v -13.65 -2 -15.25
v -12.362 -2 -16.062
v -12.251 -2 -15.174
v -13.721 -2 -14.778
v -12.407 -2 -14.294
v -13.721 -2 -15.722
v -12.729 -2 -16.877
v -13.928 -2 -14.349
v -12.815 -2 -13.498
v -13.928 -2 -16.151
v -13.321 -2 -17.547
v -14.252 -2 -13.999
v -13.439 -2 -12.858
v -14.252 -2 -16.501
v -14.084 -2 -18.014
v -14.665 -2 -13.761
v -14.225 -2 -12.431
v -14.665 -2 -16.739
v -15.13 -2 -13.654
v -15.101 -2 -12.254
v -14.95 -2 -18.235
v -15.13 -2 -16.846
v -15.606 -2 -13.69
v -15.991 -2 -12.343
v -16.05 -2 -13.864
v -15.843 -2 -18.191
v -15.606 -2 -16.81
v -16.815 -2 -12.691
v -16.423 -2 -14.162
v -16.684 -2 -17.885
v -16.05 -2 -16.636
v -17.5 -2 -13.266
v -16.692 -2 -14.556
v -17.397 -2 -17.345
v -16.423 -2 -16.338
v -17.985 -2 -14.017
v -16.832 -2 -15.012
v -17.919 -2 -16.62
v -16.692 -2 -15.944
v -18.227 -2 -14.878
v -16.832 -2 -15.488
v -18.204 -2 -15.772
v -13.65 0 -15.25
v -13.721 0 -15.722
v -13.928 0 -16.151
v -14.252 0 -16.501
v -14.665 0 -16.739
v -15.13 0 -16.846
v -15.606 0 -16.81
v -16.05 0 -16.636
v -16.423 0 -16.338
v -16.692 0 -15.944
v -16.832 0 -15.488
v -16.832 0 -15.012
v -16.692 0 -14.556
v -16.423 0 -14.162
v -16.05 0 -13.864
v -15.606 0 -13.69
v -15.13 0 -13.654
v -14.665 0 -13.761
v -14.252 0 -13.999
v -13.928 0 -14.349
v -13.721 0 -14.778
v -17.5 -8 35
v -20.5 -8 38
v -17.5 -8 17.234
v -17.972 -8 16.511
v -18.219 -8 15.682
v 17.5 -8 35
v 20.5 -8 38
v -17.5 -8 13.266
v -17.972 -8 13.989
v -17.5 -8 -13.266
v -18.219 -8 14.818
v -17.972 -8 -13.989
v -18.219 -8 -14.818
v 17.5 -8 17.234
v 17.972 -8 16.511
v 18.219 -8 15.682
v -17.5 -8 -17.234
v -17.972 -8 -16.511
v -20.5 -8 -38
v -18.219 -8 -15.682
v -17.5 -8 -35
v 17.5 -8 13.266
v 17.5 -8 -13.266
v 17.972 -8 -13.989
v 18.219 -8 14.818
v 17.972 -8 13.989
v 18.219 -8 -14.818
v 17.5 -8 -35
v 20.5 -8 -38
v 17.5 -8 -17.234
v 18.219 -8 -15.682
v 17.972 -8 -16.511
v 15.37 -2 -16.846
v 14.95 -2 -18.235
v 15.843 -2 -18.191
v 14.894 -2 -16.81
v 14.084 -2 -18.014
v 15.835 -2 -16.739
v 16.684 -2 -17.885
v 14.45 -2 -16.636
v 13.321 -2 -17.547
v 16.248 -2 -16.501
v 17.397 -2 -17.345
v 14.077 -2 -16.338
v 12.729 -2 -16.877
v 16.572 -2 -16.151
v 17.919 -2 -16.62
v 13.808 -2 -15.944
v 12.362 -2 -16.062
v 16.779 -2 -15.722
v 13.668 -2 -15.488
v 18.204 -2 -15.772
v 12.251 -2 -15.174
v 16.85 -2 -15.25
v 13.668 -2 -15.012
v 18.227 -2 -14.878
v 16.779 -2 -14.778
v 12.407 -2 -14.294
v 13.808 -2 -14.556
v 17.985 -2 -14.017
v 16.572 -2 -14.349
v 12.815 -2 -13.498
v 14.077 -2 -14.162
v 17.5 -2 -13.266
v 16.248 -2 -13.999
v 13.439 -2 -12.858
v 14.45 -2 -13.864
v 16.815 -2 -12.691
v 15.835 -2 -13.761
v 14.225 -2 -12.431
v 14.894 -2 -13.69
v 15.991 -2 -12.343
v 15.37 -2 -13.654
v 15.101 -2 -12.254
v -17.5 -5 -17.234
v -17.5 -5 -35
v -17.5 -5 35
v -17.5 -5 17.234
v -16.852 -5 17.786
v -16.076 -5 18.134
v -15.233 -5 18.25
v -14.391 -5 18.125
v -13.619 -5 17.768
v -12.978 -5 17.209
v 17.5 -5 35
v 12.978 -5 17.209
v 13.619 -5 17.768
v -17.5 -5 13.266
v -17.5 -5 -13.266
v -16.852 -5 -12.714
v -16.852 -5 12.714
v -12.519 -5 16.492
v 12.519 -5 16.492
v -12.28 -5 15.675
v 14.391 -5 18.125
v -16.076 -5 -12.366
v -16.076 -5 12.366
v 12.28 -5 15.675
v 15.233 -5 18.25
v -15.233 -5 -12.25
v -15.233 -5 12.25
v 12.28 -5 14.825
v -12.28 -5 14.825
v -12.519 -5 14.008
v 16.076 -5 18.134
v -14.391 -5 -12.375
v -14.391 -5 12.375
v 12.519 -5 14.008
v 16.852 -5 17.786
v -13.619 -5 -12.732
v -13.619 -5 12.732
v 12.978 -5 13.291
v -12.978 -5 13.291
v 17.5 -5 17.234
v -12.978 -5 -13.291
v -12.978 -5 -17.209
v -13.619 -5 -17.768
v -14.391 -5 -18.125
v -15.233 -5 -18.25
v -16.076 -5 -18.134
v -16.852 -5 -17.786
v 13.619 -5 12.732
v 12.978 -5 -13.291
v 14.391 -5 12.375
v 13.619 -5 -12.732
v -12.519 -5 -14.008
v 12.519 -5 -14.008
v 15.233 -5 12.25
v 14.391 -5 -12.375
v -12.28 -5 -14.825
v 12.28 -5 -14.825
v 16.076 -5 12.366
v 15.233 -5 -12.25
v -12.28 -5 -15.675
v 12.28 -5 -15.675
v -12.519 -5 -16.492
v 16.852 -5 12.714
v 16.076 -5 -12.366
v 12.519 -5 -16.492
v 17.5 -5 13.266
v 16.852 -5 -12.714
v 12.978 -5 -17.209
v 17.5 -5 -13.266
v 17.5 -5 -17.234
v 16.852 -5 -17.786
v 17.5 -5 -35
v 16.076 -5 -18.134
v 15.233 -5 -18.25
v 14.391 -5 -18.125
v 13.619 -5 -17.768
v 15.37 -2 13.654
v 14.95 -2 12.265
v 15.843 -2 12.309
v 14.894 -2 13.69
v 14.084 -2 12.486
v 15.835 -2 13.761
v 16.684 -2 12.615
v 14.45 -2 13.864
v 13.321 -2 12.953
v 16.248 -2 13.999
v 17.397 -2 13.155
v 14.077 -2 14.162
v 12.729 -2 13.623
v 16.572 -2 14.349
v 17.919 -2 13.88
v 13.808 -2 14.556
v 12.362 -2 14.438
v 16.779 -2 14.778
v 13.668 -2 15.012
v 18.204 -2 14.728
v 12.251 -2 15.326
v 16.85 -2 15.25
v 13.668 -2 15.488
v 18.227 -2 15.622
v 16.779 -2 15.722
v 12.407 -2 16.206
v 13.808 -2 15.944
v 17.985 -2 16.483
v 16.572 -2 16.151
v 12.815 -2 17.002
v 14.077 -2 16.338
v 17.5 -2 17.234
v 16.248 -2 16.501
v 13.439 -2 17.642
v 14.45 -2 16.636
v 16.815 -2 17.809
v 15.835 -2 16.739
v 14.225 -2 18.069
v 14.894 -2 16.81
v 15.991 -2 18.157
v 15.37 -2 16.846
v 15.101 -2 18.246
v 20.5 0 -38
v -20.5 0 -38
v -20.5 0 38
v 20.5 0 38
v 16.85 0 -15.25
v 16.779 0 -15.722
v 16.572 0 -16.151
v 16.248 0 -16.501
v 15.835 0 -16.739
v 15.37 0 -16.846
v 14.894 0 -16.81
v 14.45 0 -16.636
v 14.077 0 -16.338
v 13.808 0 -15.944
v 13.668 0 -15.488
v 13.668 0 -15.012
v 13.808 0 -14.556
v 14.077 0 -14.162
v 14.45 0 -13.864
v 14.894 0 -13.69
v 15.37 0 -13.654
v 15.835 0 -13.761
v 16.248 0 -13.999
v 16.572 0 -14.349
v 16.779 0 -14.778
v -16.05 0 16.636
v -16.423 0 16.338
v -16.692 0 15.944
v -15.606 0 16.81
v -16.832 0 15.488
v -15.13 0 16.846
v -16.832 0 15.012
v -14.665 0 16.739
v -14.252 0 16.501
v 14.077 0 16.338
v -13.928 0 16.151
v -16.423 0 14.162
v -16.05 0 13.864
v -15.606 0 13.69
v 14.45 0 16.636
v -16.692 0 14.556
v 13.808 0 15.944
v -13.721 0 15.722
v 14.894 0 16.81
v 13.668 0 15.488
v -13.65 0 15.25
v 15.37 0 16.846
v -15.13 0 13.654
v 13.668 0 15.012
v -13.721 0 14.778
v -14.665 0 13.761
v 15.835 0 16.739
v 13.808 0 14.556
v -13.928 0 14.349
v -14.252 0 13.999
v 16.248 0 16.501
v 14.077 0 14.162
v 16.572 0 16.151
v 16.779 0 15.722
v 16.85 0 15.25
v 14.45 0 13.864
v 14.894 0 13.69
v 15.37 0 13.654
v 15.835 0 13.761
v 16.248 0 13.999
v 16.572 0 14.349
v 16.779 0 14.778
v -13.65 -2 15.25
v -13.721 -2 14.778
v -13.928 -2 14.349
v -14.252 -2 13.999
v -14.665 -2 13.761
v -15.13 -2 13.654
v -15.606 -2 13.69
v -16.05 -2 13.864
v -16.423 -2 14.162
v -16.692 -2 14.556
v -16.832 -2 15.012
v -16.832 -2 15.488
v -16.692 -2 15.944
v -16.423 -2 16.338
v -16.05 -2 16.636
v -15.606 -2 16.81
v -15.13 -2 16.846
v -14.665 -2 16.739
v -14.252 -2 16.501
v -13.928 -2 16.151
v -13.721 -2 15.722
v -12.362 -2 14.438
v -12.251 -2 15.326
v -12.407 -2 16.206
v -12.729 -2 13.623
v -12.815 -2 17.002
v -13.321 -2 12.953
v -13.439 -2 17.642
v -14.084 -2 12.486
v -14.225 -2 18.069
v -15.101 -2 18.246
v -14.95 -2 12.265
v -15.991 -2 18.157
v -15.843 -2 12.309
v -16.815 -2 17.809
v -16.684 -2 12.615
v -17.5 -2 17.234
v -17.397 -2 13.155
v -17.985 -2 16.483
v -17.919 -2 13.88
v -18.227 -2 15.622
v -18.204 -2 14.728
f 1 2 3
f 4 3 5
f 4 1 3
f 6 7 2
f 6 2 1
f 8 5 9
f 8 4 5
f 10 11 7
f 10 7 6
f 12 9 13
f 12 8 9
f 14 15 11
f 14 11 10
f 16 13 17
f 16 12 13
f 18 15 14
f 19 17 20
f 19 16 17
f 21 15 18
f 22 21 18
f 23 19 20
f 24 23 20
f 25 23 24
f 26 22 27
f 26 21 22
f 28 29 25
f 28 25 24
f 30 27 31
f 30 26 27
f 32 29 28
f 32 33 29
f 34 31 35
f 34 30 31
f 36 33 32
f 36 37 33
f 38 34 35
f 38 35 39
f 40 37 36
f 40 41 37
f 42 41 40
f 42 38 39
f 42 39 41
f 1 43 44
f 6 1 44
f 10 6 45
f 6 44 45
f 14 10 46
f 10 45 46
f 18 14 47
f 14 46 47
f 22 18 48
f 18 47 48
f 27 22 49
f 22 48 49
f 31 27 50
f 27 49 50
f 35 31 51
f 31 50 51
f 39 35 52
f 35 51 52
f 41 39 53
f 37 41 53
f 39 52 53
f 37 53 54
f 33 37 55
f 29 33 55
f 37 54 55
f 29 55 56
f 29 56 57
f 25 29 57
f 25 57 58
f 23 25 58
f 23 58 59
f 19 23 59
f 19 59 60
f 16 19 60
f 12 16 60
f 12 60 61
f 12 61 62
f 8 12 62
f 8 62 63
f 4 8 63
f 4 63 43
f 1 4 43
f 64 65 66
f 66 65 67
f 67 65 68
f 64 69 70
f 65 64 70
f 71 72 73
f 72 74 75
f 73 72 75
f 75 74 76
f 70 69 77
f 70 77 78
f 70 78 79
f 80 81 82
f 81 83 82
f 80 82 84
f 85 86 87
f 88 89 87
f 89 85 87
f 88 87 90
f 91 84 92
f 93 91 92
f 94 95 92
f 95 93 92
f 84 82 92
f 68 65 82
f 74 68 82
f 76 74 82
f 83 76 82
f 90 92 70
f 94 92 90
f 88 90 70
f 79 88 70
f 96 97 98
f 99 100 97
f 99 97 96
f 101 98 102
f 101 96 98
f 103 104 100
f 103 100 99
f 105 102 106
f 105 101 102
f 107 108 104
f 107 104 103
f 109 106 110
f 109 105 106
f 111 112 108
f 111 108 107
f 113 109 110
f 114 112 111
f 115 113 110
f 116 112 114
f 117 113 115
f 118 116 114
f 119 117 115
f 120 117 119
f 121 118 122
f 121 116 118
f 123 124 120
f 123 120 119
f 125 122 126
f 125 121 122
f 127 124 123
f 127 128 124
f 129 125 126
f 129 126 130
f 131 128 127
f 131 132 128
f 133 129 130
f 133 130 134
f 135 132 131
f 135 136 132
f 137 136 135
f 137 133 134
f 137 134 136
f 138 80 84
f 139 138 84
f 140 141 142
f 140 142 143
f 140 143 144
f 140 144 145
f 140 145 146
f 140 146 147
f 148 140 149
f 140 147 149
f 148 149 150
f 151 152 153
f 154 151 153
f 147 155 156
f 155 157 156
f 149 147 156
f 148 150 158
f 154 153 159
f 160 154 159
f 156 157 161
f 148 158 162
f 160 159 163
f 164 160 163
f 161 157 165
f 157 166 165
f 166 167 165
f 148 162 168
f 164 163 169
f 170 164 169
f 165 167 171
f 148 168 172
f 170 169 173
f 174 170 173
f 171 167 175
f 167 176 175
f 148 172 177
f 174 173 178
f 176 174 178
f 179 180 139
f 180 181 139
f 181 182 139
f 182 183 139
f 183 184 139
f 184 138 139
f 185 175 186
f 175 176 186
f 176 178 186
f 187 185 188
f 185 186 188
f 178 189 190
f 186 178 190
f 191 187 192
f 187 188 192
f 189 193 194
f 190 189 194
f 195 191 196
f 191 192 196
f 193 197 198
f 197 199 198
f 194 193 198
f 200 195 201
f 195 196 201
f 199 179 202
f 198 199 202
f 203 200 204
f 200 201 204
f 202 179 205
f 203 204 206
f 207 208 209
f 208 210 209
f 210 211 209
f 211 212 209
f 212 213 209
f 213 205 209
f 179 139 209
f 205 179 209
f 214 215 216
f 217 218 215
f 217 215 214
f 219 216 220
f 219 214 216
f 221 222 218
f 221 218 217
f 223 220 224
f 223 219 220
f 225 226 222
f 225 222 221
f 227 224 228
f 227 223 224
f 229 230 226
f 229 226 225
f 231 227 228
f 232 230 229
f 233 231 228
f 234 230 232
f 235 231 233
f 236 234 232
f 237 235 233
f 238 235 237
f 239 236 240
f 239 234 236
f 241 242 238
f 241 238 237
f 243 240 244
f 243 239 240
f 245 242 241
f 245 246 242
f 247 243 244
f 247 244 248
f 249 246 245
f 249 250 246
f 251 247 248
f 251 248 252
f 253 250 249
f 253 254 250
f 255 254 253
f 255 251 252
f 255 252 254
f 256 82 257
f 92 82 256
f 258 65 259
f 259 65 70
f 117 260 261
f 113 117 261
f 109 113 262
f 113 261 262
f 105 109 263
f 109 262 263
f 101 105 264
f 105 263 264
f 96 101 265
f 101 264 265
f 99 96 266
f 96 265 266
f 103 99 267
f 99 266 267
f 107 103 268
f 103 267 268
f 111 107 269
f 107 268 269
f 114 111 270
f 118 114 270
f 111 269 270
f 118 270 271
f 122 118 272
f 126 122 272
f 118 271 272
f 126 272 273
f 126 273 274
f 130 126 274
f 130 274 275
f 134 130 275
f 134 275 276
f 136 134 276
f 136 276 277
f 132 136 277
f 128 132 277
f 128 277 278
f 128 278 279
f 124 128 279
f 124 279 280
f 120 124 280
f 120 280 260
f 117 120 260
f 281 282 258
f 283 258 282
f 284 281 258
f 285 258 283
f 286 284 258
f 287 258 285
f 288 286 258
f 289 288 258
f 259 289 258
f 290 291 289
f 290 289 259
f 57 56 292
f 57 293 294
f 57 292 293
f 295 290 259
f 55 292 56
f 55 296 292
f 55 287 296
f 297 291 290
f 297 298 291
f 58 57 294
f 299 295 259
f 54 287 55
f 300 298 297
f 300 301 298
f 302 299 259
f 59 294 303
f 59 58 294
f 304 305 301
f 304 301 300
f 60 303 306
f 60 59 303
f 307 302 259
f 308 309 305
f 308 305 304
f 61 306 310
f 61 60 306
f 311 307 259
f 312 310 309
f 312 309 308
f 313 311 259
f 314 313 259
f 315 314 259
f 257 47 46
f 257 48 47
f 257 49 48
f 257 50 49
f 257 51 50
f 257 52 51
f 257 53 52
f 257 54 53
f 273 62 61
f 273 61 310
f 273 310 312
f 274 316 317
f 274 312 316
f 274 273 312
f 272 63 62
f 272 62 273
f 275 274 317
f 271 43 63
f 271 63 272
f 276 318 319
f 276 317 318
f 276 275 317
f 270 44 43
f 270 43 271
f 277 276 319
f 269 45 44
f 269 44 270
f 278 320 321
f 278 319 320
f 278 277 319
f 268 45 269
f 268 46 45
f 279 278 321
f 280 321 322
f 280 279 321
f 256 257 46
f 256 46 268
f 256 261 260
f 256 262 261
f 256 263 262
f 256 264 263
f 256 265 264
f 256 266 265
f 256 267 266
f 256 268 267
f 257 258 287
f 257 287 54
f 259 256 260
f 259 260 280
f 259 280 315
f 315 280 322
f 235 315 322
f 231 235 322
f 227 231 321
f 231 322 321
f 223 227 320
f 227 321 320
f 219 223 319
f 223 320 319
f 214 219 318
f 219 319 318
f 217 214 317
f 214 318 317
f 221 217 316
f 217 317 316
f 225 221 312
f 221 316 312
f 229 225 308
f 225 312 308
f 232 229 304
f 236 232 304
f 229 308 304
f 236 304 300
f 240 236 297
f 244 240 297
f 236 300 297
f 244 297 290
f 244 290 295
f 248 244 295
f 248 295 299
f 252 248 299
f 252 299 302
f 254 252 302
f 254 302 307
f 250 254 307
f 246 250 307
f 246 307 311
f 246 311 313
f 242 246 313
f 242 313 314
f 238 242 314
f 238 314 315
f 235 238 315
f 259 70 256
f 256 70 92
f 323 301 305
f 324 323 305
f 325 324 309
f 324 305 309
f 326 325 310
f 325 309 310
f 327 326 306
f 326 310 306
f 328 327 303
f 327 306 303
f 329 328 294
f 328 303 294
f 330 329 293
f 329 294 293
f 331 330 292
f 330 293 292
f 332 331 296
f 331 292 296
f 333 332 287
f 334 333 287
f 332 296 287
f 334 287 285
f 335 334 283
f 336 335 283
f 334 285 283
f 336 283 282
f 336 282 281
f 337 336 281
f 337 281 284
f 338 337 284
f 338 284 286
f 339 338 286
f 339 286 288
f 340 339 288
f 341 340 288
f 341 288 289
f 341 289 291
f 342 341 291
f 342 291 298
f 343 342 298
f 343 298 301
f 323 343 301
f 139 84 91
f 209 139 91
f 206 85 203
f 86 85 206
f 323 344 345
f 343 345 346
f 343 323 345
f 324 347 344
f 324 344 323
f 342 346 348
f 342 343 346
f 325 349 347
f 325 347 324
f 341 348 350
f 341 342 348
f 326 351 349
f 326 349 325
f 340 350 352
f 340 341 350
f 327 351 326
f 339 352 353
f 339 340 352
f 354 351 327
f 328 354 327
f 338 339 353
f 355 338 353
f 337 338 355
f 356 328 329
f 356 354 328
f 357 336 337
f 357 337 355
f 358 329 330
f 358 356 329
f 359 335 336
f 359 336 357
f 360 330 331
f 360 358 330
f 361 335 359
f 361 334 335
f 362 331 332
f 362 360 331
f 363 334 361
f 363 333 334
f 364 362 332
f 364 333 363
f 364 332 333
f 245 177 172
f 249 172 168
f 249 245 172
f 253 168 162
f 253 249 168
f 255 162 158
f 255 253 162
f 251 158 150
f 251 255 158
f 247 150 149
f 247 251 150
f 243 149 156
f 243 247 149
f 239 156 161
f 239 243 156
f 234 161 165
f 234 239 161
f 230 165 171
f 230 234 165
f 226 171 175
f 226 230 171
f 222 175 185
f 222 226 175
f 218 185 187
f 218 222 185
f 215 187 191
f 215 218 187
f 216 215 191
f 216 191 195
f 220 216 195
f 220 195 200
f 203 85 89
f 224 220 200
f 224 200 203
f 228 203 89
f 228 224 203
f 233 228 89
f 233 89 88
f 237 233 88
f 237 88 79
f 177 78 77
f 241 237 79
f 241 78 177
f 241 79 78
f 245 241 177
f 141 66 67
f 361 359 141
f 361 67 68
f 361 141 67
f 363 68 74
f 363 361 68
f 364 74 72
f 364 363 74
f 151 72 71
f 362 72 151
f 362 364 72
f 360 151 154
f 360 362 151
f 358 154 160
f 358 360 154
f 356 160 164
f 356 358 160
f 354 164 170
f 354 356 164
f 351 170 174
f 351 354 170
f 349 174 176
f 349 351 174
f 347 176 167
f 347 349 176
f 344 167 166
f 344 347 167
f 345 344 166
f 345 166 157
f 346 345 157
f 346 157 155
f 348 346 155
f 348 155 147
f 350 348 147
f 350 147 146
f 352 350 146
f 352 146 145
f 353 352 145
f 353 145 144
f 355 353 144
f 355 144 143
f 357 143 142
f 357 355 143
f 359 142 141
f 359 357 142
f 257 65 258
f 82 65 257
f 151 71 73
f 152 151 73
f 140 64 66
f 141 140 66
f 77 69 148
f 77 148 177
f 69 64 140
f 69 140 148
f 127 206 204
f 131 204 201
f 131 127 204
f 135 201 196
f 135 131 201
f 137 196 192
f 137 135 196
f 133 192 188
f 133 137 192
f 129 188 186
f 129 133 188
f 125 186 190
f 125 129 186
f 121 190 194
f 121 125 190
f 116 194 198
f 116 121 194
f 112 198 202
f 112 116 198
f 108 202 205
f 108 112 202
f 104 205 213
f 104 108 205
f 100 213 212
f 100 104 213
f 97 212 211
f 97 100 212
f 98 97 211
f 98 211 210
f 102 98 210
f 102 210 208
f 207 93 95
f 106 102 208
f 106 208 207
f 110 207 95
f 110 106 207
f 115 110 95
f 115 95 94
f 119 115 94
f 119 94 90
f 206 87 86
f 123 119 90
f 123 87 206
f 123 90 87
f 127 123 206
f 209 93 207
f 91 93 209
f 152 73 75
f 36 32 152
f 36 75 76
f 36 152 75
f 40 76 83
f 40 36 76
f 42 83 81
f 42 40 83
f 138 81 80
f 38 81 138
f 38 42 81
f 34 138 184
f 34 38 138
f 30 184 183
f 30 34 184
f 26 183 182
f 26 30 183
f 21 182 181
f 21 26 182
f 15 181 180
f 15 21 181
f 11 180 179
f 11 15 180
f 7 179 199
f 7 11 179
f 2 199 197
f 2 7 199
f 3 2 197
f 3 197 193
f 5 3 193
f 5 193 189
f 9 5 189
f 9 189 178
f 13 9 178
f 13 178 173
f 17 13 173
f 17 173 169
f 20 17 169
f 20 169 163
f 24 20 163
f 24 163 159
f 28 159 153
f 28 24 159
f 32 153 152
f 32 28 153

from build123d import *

# Parameters (mm, degrees)
SKETCH1_W                  = 35
SKETCH1_H                  = 70
BOSS_EXTRUDE1_DEPTH        = 5
EXTRUDE_THIN1_DEPTH        = 5
EXTRUDE_THIN1_DEPTH_BACK   = 3
SKETCH9_W                  = 41
SKETCH9_H                  = 76
SKETCH9_W_2                = 35
SKETCH9_H_2                = 70
F_3_2_3_2_DIAMETER_HOLE1_D = 3.2
CUT_EXTRUDE1_DEPTH         = 44.465503563
CUT_EXTRUDE1_DEPTH_BACK    = 3
SKETCH8_R                  = 3


with BuildPart() as part:
    # Sketch1 → Boss-Extrude1 (new body)
    with BuildSketch(Plane(origin=(0, 0, 0), x_dir=(1, 0, 0), z_dir=(0, 1, 0))):
        Rectangle(SKETCH1_W, SKETCH1_H)
    extrude(amount=-BOSS_EXTRUDE1_DEPTH)

    # Sketch9 → Extrude-Thin1 (add, two sides: drawn at the far end of the back side and taken through both)
    with BuildSketch(Plane(origin=(0, -5, 0), x_dir=(1, 0, 0), z_dir=(0, 1, 0)).offset(-EXTRUDE_THIN1_DEPTH_BACK)):
        Rectangle(SKETCH9_W, SKETCH9_H)
        Rectangle(SKETCH9_W_2, SKETCH9_H_2, mode=Mode.SUBTRACT)
    extrude(amount=EXTRUDE_THIN1_DEPTH + EXTRUDE_THIN1_DEPTH_BACK)

    # Ø3.2 (3.2) Diameter Hole1 (through all)
    with Locations(Plane(origin=(0, -5, 0), x_dir=(-1, 0, 0), z_dir=(0, -1, 0))):
        with Locations((15.25, 15.25), (15.25, -15.25), (-15.25, -15.25), (-15.25, 15.25)):
            Hole(F_3_2_3_2_DIAMETER_HOLE1_D / 2)

    # Sketch8 → Cut-Extrude1 (cut, two sides: drawn at the far end of the back side and taken through both)
    with BuildSketch(Plane.XZ.offset(5).offset(-CUT_EXTRUDE1_DEPTH_BACK)):
        with Locations(Location((-15.25, 15.25, 0), (0, 0, 138.590377891))):
            Circle(SKETCH8_R)
        with Locations(Location((15.25, 15.25, 0), (0, 0, 41.409622109))):
            Circle(SKETCH8_R)
        with Locations(Location((15.25, -15.25, 0), (0, 0, 41.409622109))):
            Circle(SKETCH8_R)
        with Locations(Location((-15.25, -15.25, 0), (0, 0, 138.590377891))):
            Circle(SKETCH8_R)
    extrude(amount=CUT_EXTRUDE1_DEPTH + CUT_EXTRUDE1_DEPTH_BACK, mode=Mode.SUBTRACT)


solid = part.part
